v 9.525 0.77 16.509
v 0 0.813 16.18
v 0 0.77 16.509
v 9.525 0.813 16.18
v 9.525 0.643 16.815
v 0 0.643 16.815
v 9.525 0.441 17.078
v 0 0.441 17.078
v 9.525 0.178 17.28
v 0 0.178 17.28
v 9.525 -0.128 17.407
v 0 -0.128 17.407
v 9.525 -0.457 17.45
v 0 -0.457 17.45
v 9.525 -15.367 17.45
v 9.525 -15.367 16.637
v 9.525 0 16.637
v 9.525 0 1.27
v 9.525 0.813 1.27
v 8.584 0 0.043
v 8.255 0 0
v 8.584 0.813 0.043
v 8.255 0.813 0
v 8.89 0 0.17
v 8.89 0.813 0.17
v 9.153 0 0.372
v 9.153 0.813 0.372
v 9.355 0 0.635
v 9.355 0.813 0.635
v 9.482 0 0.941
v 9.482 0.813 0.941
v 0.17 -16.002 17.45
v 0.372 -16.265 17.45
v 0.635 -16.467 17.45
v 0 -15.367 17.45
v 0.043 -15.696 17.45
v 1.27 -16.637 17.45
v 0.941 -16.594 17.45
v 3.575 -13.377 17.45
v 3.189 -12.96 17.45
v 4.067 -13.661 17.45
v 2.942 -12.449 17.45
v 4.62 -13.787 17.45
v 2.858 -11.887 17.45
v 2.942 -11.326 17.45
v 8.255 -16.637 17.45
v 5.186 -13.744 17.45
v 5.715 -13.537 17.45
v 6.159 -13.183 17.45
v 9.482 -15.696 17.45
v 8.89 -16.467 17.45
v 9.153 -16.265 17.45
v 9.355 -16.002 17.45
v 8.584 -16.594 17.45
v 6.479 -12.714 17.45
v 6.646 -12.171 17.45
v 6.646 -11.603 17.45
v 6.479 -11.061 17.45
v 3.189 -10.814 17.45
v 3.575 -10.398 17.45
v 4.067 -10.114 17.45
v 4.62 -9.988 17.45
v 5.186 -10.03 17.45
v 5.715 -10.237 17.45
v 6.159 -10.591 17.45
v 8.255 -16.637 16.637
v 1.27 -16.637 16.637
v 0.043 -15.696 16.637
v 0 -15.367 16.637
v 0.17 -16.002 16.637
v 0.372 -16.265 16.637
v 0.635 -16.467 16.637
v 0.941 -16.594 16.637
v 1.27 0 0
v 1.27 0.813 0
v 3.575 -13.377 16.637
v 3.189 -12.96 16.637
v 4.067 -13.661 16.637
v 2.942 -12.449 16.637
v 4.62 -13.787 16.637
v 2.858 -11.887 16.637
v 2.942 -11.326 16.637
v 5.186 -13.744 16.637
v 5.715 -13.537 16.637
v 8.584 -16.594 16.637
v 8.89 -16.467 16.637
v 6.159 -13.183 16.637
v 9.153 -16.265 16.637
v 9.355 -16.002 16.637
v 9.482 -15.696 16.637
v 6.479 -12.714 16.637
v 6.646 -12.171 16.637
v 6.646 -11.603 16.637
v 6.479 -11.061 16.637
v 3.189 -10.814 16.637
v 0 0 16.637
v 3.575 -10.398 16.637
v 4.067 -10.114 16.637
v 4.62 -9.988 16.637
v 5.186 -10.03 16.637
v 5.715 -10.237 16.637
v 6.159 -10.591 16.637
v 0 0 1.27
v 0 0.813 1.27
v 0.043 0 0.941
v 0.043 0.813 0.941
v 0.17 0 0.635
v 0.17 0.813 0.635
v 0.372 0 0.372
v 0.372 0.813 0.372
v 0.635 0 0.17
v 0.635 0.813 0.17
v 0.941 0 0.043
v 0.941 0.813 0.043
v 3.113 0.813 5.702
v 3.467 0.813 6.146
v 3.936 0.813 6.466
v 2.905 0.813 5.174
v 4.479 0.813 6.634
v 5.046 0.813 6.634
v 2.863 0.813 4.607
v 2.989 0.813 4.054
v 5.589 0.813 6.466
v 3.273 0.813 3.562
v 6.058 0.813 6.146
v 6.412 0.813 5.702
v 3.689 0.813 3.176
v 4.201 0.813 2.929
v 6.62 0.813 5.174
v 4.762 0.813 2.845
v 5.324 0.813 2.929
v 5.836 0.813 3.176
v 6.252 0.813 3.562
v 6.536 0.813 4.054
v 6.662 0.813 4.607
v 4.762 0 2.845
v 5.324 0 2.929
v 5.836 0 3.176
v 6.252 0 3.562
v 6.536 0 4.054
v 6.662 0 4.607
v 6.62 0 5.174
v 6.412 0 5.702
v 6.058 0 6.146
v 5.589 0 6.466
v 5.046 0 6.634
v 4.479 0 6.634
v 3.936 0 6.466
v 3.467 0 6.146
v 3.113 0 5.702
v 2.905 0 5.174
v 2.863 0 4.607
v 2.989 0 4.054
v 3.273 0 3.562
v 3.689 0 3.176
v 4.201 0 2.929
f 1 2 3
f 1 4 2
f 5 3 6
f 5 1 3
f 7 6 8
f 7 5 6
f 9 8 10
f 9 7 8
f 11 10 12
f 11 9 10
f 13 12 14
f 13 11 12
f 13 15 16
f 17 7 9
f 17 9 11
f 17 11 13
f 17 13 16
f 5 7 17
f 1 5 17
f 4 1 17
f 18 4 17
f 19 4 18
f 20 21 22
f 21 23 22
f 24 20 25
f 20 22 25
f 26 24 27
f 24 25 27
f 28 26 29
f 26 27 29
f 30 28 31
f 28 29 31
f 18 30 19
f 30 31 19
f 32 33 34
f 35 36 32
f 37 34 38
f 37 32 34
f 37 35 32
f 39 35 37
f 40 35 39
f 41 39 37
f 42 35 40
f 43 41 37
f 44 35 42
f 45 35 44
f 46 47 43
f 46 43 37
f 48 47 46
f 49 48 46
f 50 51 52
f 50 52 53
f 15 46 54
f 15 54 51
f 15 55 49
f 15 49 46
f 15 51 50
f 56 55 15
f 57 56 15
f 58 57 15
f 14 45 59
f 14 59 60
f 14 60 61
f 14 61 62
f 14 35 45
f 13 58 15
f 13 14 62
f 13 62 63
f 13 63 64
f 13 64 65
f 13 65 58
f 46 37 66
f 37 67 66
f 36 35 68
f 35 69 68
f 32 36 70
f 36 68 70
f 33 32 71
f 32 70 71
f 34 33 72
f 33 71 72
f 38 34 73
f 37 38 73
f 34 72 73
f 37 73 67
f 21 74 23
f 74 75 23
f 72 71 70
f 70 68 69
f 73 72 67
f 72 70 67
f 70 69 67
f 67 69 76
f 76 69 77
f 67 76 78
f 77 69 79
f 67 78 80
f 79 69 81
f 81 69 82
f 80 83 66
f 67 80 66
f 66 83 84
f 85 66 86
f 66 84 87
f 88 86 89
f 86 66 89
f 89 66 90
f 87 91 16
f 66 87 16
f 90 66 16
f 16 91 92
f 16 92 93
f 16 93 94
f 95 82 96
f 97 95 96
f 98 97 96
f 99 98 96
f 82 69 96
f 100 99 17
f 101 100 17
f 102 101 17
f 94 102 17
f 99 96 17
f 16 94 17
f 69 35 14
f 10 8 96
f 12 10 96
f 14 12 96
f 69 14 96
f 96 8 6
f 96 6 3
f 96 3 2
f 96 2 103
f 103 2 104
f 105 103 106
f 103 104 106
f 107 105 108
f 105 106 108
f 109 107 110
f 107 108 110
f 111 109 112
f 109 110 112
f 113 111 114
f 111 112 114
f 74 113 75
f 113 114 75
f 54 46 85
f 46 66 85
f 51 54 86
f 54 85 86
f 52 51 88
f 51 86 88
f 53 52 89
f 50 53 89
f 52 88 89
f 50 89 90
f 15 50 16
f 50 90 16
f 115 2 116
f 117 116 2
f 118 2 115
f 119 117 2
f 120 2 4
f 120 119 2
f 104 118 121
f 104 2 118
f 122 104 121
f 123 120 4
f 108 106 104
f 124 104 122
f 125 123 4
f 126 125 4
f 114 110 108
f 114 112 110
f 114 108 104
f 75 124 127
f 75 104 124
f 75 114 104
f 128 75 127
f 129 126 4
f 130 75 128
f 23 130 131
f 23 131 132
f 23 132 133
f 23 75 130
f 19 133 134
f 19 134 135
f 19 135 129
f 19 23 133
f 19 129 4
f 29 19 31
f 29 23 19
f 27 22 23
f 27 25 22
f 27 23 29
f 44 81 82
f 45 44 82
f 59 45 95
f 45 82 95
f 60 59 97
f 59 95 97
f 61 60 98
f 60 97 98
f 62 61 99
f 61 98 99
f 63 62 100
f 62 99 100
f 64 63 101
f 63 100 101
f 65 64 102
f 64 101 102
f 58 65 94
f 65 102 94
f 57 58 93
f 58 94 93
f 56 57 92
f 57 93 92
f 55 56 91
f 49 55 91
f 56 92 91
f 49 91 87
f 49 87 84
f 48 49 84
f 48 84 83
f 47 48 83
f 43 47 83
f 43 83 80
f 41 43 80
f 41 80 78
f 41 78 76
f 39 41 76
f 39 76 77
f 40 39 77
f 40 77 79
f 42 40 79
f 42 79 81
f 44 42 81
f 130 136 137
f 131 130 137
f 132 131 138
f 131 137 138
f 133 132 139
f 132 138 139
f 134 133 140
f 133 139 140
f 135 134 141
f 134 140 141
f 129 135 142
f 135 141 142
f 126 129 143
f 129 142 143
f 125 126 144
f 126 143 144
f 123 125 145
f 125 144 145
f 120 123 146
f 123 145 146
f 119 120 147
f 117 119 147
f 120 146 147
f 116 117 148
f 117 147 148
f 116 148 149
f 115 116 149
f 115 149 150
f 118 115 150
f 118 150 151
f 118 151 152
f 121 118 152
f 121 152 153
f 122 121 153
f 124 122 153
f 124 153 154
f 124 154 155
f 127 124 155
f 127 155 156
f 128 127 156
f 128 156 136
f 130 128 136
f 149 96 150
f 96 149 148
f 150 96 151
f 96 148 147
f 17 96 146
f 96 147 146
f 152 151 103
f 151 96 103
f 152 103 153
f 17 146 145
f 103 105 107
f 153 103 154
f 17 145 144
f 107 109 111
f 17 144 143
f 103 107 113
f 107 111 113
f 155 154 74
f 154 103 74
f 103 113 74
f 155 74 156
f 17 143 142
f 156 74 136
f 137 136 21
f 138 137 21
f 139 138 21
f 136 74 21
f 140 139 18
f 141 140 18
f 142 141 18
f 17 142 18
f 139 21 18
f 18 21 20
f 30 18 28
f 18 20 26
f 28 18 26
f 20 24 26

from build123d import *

# Parameters (mm, degrees)
SKETCH1_W           = 9.525
SKETCH1_H           = 0.8128
BOSS_EXTRUDE1_DEPTH = 17.4498
SKETCH2_W           = 9.525
SKETCH2_H           = 0.8128
BOSS_EXTRUDE2_DEPTH = 17.4498
SKETCH3_R           = 1.905
CUT_EXTRUDE1_DEPTH  = 17.4498
SKETCH4_R           = 1.905
CUT_EXTRUDE2_DEPTH  = 17.4498
FILLET1_R           = 1.27


with BuildPart() as part:
    # Sketch1 → Boss-Extrude1 (new body)
    with BuildSketch(Plane.XY):
        with Locations((4.7625, 0.4064)):
            Rectangle(SKETCH1_W, SKETCH1_H)
    extrude(amount=BOSS_EXTRUDE1_DEPTH)

    # Sketch2 → Boss-Extrude2 (add)
    with BuildSketch(Plane(origin=(0, 0.8128, 0), x_dir=(1, 0, 0), z_dir=(0, 1, 0))):
        with Locations((4.7625, -17.0434)):
            Rectangle(SKETCH2_W, SKETCH2_H)
    extrude(amount=-BOSS_EXTRUDE2_DEPTH)

    # Sketch3 → Cut-Extrude1 (cut)
    with BuildSketch(Plane.XZ):
        with Locations(Location((4.7625, 4.7498, 0), (0, 0, 270))):
            Circle(SKETCH3_R)
    extrude(amount=-CUT_EXTRUDE1_DEPTH, mode=Mode.SUBTRACT)

    # Sketch4 → Cut-Extrude2 (cut)
    with BuildSketch(Plane(origin=(0, 0, 16.637), x_dir=(-1, 0, 0), z_dir=(0, 0, -1))):
        with Locations((-4.7625, -11.8872)):
            Circle(SKETCH4_R)
    extrude(amount=-CUT_EXTRUDE2_DEPTH, mode=Mode.SUBTRACT)

    # Fillet1
    fillet1_edges = [part.edges().sort_by_distance(p)[0] for p in [
        (4.7625, 0.8128, 17.4498),
        (0, -16.637, 17.0434),
        (9.525, -16.637, 17.0434),
        (9.525, 0.4064, 0),
        (0, 0.4064, 0),
    ]]
    fillet(fillet1_edges, radius=FILLET1_R)


solid = part.part
